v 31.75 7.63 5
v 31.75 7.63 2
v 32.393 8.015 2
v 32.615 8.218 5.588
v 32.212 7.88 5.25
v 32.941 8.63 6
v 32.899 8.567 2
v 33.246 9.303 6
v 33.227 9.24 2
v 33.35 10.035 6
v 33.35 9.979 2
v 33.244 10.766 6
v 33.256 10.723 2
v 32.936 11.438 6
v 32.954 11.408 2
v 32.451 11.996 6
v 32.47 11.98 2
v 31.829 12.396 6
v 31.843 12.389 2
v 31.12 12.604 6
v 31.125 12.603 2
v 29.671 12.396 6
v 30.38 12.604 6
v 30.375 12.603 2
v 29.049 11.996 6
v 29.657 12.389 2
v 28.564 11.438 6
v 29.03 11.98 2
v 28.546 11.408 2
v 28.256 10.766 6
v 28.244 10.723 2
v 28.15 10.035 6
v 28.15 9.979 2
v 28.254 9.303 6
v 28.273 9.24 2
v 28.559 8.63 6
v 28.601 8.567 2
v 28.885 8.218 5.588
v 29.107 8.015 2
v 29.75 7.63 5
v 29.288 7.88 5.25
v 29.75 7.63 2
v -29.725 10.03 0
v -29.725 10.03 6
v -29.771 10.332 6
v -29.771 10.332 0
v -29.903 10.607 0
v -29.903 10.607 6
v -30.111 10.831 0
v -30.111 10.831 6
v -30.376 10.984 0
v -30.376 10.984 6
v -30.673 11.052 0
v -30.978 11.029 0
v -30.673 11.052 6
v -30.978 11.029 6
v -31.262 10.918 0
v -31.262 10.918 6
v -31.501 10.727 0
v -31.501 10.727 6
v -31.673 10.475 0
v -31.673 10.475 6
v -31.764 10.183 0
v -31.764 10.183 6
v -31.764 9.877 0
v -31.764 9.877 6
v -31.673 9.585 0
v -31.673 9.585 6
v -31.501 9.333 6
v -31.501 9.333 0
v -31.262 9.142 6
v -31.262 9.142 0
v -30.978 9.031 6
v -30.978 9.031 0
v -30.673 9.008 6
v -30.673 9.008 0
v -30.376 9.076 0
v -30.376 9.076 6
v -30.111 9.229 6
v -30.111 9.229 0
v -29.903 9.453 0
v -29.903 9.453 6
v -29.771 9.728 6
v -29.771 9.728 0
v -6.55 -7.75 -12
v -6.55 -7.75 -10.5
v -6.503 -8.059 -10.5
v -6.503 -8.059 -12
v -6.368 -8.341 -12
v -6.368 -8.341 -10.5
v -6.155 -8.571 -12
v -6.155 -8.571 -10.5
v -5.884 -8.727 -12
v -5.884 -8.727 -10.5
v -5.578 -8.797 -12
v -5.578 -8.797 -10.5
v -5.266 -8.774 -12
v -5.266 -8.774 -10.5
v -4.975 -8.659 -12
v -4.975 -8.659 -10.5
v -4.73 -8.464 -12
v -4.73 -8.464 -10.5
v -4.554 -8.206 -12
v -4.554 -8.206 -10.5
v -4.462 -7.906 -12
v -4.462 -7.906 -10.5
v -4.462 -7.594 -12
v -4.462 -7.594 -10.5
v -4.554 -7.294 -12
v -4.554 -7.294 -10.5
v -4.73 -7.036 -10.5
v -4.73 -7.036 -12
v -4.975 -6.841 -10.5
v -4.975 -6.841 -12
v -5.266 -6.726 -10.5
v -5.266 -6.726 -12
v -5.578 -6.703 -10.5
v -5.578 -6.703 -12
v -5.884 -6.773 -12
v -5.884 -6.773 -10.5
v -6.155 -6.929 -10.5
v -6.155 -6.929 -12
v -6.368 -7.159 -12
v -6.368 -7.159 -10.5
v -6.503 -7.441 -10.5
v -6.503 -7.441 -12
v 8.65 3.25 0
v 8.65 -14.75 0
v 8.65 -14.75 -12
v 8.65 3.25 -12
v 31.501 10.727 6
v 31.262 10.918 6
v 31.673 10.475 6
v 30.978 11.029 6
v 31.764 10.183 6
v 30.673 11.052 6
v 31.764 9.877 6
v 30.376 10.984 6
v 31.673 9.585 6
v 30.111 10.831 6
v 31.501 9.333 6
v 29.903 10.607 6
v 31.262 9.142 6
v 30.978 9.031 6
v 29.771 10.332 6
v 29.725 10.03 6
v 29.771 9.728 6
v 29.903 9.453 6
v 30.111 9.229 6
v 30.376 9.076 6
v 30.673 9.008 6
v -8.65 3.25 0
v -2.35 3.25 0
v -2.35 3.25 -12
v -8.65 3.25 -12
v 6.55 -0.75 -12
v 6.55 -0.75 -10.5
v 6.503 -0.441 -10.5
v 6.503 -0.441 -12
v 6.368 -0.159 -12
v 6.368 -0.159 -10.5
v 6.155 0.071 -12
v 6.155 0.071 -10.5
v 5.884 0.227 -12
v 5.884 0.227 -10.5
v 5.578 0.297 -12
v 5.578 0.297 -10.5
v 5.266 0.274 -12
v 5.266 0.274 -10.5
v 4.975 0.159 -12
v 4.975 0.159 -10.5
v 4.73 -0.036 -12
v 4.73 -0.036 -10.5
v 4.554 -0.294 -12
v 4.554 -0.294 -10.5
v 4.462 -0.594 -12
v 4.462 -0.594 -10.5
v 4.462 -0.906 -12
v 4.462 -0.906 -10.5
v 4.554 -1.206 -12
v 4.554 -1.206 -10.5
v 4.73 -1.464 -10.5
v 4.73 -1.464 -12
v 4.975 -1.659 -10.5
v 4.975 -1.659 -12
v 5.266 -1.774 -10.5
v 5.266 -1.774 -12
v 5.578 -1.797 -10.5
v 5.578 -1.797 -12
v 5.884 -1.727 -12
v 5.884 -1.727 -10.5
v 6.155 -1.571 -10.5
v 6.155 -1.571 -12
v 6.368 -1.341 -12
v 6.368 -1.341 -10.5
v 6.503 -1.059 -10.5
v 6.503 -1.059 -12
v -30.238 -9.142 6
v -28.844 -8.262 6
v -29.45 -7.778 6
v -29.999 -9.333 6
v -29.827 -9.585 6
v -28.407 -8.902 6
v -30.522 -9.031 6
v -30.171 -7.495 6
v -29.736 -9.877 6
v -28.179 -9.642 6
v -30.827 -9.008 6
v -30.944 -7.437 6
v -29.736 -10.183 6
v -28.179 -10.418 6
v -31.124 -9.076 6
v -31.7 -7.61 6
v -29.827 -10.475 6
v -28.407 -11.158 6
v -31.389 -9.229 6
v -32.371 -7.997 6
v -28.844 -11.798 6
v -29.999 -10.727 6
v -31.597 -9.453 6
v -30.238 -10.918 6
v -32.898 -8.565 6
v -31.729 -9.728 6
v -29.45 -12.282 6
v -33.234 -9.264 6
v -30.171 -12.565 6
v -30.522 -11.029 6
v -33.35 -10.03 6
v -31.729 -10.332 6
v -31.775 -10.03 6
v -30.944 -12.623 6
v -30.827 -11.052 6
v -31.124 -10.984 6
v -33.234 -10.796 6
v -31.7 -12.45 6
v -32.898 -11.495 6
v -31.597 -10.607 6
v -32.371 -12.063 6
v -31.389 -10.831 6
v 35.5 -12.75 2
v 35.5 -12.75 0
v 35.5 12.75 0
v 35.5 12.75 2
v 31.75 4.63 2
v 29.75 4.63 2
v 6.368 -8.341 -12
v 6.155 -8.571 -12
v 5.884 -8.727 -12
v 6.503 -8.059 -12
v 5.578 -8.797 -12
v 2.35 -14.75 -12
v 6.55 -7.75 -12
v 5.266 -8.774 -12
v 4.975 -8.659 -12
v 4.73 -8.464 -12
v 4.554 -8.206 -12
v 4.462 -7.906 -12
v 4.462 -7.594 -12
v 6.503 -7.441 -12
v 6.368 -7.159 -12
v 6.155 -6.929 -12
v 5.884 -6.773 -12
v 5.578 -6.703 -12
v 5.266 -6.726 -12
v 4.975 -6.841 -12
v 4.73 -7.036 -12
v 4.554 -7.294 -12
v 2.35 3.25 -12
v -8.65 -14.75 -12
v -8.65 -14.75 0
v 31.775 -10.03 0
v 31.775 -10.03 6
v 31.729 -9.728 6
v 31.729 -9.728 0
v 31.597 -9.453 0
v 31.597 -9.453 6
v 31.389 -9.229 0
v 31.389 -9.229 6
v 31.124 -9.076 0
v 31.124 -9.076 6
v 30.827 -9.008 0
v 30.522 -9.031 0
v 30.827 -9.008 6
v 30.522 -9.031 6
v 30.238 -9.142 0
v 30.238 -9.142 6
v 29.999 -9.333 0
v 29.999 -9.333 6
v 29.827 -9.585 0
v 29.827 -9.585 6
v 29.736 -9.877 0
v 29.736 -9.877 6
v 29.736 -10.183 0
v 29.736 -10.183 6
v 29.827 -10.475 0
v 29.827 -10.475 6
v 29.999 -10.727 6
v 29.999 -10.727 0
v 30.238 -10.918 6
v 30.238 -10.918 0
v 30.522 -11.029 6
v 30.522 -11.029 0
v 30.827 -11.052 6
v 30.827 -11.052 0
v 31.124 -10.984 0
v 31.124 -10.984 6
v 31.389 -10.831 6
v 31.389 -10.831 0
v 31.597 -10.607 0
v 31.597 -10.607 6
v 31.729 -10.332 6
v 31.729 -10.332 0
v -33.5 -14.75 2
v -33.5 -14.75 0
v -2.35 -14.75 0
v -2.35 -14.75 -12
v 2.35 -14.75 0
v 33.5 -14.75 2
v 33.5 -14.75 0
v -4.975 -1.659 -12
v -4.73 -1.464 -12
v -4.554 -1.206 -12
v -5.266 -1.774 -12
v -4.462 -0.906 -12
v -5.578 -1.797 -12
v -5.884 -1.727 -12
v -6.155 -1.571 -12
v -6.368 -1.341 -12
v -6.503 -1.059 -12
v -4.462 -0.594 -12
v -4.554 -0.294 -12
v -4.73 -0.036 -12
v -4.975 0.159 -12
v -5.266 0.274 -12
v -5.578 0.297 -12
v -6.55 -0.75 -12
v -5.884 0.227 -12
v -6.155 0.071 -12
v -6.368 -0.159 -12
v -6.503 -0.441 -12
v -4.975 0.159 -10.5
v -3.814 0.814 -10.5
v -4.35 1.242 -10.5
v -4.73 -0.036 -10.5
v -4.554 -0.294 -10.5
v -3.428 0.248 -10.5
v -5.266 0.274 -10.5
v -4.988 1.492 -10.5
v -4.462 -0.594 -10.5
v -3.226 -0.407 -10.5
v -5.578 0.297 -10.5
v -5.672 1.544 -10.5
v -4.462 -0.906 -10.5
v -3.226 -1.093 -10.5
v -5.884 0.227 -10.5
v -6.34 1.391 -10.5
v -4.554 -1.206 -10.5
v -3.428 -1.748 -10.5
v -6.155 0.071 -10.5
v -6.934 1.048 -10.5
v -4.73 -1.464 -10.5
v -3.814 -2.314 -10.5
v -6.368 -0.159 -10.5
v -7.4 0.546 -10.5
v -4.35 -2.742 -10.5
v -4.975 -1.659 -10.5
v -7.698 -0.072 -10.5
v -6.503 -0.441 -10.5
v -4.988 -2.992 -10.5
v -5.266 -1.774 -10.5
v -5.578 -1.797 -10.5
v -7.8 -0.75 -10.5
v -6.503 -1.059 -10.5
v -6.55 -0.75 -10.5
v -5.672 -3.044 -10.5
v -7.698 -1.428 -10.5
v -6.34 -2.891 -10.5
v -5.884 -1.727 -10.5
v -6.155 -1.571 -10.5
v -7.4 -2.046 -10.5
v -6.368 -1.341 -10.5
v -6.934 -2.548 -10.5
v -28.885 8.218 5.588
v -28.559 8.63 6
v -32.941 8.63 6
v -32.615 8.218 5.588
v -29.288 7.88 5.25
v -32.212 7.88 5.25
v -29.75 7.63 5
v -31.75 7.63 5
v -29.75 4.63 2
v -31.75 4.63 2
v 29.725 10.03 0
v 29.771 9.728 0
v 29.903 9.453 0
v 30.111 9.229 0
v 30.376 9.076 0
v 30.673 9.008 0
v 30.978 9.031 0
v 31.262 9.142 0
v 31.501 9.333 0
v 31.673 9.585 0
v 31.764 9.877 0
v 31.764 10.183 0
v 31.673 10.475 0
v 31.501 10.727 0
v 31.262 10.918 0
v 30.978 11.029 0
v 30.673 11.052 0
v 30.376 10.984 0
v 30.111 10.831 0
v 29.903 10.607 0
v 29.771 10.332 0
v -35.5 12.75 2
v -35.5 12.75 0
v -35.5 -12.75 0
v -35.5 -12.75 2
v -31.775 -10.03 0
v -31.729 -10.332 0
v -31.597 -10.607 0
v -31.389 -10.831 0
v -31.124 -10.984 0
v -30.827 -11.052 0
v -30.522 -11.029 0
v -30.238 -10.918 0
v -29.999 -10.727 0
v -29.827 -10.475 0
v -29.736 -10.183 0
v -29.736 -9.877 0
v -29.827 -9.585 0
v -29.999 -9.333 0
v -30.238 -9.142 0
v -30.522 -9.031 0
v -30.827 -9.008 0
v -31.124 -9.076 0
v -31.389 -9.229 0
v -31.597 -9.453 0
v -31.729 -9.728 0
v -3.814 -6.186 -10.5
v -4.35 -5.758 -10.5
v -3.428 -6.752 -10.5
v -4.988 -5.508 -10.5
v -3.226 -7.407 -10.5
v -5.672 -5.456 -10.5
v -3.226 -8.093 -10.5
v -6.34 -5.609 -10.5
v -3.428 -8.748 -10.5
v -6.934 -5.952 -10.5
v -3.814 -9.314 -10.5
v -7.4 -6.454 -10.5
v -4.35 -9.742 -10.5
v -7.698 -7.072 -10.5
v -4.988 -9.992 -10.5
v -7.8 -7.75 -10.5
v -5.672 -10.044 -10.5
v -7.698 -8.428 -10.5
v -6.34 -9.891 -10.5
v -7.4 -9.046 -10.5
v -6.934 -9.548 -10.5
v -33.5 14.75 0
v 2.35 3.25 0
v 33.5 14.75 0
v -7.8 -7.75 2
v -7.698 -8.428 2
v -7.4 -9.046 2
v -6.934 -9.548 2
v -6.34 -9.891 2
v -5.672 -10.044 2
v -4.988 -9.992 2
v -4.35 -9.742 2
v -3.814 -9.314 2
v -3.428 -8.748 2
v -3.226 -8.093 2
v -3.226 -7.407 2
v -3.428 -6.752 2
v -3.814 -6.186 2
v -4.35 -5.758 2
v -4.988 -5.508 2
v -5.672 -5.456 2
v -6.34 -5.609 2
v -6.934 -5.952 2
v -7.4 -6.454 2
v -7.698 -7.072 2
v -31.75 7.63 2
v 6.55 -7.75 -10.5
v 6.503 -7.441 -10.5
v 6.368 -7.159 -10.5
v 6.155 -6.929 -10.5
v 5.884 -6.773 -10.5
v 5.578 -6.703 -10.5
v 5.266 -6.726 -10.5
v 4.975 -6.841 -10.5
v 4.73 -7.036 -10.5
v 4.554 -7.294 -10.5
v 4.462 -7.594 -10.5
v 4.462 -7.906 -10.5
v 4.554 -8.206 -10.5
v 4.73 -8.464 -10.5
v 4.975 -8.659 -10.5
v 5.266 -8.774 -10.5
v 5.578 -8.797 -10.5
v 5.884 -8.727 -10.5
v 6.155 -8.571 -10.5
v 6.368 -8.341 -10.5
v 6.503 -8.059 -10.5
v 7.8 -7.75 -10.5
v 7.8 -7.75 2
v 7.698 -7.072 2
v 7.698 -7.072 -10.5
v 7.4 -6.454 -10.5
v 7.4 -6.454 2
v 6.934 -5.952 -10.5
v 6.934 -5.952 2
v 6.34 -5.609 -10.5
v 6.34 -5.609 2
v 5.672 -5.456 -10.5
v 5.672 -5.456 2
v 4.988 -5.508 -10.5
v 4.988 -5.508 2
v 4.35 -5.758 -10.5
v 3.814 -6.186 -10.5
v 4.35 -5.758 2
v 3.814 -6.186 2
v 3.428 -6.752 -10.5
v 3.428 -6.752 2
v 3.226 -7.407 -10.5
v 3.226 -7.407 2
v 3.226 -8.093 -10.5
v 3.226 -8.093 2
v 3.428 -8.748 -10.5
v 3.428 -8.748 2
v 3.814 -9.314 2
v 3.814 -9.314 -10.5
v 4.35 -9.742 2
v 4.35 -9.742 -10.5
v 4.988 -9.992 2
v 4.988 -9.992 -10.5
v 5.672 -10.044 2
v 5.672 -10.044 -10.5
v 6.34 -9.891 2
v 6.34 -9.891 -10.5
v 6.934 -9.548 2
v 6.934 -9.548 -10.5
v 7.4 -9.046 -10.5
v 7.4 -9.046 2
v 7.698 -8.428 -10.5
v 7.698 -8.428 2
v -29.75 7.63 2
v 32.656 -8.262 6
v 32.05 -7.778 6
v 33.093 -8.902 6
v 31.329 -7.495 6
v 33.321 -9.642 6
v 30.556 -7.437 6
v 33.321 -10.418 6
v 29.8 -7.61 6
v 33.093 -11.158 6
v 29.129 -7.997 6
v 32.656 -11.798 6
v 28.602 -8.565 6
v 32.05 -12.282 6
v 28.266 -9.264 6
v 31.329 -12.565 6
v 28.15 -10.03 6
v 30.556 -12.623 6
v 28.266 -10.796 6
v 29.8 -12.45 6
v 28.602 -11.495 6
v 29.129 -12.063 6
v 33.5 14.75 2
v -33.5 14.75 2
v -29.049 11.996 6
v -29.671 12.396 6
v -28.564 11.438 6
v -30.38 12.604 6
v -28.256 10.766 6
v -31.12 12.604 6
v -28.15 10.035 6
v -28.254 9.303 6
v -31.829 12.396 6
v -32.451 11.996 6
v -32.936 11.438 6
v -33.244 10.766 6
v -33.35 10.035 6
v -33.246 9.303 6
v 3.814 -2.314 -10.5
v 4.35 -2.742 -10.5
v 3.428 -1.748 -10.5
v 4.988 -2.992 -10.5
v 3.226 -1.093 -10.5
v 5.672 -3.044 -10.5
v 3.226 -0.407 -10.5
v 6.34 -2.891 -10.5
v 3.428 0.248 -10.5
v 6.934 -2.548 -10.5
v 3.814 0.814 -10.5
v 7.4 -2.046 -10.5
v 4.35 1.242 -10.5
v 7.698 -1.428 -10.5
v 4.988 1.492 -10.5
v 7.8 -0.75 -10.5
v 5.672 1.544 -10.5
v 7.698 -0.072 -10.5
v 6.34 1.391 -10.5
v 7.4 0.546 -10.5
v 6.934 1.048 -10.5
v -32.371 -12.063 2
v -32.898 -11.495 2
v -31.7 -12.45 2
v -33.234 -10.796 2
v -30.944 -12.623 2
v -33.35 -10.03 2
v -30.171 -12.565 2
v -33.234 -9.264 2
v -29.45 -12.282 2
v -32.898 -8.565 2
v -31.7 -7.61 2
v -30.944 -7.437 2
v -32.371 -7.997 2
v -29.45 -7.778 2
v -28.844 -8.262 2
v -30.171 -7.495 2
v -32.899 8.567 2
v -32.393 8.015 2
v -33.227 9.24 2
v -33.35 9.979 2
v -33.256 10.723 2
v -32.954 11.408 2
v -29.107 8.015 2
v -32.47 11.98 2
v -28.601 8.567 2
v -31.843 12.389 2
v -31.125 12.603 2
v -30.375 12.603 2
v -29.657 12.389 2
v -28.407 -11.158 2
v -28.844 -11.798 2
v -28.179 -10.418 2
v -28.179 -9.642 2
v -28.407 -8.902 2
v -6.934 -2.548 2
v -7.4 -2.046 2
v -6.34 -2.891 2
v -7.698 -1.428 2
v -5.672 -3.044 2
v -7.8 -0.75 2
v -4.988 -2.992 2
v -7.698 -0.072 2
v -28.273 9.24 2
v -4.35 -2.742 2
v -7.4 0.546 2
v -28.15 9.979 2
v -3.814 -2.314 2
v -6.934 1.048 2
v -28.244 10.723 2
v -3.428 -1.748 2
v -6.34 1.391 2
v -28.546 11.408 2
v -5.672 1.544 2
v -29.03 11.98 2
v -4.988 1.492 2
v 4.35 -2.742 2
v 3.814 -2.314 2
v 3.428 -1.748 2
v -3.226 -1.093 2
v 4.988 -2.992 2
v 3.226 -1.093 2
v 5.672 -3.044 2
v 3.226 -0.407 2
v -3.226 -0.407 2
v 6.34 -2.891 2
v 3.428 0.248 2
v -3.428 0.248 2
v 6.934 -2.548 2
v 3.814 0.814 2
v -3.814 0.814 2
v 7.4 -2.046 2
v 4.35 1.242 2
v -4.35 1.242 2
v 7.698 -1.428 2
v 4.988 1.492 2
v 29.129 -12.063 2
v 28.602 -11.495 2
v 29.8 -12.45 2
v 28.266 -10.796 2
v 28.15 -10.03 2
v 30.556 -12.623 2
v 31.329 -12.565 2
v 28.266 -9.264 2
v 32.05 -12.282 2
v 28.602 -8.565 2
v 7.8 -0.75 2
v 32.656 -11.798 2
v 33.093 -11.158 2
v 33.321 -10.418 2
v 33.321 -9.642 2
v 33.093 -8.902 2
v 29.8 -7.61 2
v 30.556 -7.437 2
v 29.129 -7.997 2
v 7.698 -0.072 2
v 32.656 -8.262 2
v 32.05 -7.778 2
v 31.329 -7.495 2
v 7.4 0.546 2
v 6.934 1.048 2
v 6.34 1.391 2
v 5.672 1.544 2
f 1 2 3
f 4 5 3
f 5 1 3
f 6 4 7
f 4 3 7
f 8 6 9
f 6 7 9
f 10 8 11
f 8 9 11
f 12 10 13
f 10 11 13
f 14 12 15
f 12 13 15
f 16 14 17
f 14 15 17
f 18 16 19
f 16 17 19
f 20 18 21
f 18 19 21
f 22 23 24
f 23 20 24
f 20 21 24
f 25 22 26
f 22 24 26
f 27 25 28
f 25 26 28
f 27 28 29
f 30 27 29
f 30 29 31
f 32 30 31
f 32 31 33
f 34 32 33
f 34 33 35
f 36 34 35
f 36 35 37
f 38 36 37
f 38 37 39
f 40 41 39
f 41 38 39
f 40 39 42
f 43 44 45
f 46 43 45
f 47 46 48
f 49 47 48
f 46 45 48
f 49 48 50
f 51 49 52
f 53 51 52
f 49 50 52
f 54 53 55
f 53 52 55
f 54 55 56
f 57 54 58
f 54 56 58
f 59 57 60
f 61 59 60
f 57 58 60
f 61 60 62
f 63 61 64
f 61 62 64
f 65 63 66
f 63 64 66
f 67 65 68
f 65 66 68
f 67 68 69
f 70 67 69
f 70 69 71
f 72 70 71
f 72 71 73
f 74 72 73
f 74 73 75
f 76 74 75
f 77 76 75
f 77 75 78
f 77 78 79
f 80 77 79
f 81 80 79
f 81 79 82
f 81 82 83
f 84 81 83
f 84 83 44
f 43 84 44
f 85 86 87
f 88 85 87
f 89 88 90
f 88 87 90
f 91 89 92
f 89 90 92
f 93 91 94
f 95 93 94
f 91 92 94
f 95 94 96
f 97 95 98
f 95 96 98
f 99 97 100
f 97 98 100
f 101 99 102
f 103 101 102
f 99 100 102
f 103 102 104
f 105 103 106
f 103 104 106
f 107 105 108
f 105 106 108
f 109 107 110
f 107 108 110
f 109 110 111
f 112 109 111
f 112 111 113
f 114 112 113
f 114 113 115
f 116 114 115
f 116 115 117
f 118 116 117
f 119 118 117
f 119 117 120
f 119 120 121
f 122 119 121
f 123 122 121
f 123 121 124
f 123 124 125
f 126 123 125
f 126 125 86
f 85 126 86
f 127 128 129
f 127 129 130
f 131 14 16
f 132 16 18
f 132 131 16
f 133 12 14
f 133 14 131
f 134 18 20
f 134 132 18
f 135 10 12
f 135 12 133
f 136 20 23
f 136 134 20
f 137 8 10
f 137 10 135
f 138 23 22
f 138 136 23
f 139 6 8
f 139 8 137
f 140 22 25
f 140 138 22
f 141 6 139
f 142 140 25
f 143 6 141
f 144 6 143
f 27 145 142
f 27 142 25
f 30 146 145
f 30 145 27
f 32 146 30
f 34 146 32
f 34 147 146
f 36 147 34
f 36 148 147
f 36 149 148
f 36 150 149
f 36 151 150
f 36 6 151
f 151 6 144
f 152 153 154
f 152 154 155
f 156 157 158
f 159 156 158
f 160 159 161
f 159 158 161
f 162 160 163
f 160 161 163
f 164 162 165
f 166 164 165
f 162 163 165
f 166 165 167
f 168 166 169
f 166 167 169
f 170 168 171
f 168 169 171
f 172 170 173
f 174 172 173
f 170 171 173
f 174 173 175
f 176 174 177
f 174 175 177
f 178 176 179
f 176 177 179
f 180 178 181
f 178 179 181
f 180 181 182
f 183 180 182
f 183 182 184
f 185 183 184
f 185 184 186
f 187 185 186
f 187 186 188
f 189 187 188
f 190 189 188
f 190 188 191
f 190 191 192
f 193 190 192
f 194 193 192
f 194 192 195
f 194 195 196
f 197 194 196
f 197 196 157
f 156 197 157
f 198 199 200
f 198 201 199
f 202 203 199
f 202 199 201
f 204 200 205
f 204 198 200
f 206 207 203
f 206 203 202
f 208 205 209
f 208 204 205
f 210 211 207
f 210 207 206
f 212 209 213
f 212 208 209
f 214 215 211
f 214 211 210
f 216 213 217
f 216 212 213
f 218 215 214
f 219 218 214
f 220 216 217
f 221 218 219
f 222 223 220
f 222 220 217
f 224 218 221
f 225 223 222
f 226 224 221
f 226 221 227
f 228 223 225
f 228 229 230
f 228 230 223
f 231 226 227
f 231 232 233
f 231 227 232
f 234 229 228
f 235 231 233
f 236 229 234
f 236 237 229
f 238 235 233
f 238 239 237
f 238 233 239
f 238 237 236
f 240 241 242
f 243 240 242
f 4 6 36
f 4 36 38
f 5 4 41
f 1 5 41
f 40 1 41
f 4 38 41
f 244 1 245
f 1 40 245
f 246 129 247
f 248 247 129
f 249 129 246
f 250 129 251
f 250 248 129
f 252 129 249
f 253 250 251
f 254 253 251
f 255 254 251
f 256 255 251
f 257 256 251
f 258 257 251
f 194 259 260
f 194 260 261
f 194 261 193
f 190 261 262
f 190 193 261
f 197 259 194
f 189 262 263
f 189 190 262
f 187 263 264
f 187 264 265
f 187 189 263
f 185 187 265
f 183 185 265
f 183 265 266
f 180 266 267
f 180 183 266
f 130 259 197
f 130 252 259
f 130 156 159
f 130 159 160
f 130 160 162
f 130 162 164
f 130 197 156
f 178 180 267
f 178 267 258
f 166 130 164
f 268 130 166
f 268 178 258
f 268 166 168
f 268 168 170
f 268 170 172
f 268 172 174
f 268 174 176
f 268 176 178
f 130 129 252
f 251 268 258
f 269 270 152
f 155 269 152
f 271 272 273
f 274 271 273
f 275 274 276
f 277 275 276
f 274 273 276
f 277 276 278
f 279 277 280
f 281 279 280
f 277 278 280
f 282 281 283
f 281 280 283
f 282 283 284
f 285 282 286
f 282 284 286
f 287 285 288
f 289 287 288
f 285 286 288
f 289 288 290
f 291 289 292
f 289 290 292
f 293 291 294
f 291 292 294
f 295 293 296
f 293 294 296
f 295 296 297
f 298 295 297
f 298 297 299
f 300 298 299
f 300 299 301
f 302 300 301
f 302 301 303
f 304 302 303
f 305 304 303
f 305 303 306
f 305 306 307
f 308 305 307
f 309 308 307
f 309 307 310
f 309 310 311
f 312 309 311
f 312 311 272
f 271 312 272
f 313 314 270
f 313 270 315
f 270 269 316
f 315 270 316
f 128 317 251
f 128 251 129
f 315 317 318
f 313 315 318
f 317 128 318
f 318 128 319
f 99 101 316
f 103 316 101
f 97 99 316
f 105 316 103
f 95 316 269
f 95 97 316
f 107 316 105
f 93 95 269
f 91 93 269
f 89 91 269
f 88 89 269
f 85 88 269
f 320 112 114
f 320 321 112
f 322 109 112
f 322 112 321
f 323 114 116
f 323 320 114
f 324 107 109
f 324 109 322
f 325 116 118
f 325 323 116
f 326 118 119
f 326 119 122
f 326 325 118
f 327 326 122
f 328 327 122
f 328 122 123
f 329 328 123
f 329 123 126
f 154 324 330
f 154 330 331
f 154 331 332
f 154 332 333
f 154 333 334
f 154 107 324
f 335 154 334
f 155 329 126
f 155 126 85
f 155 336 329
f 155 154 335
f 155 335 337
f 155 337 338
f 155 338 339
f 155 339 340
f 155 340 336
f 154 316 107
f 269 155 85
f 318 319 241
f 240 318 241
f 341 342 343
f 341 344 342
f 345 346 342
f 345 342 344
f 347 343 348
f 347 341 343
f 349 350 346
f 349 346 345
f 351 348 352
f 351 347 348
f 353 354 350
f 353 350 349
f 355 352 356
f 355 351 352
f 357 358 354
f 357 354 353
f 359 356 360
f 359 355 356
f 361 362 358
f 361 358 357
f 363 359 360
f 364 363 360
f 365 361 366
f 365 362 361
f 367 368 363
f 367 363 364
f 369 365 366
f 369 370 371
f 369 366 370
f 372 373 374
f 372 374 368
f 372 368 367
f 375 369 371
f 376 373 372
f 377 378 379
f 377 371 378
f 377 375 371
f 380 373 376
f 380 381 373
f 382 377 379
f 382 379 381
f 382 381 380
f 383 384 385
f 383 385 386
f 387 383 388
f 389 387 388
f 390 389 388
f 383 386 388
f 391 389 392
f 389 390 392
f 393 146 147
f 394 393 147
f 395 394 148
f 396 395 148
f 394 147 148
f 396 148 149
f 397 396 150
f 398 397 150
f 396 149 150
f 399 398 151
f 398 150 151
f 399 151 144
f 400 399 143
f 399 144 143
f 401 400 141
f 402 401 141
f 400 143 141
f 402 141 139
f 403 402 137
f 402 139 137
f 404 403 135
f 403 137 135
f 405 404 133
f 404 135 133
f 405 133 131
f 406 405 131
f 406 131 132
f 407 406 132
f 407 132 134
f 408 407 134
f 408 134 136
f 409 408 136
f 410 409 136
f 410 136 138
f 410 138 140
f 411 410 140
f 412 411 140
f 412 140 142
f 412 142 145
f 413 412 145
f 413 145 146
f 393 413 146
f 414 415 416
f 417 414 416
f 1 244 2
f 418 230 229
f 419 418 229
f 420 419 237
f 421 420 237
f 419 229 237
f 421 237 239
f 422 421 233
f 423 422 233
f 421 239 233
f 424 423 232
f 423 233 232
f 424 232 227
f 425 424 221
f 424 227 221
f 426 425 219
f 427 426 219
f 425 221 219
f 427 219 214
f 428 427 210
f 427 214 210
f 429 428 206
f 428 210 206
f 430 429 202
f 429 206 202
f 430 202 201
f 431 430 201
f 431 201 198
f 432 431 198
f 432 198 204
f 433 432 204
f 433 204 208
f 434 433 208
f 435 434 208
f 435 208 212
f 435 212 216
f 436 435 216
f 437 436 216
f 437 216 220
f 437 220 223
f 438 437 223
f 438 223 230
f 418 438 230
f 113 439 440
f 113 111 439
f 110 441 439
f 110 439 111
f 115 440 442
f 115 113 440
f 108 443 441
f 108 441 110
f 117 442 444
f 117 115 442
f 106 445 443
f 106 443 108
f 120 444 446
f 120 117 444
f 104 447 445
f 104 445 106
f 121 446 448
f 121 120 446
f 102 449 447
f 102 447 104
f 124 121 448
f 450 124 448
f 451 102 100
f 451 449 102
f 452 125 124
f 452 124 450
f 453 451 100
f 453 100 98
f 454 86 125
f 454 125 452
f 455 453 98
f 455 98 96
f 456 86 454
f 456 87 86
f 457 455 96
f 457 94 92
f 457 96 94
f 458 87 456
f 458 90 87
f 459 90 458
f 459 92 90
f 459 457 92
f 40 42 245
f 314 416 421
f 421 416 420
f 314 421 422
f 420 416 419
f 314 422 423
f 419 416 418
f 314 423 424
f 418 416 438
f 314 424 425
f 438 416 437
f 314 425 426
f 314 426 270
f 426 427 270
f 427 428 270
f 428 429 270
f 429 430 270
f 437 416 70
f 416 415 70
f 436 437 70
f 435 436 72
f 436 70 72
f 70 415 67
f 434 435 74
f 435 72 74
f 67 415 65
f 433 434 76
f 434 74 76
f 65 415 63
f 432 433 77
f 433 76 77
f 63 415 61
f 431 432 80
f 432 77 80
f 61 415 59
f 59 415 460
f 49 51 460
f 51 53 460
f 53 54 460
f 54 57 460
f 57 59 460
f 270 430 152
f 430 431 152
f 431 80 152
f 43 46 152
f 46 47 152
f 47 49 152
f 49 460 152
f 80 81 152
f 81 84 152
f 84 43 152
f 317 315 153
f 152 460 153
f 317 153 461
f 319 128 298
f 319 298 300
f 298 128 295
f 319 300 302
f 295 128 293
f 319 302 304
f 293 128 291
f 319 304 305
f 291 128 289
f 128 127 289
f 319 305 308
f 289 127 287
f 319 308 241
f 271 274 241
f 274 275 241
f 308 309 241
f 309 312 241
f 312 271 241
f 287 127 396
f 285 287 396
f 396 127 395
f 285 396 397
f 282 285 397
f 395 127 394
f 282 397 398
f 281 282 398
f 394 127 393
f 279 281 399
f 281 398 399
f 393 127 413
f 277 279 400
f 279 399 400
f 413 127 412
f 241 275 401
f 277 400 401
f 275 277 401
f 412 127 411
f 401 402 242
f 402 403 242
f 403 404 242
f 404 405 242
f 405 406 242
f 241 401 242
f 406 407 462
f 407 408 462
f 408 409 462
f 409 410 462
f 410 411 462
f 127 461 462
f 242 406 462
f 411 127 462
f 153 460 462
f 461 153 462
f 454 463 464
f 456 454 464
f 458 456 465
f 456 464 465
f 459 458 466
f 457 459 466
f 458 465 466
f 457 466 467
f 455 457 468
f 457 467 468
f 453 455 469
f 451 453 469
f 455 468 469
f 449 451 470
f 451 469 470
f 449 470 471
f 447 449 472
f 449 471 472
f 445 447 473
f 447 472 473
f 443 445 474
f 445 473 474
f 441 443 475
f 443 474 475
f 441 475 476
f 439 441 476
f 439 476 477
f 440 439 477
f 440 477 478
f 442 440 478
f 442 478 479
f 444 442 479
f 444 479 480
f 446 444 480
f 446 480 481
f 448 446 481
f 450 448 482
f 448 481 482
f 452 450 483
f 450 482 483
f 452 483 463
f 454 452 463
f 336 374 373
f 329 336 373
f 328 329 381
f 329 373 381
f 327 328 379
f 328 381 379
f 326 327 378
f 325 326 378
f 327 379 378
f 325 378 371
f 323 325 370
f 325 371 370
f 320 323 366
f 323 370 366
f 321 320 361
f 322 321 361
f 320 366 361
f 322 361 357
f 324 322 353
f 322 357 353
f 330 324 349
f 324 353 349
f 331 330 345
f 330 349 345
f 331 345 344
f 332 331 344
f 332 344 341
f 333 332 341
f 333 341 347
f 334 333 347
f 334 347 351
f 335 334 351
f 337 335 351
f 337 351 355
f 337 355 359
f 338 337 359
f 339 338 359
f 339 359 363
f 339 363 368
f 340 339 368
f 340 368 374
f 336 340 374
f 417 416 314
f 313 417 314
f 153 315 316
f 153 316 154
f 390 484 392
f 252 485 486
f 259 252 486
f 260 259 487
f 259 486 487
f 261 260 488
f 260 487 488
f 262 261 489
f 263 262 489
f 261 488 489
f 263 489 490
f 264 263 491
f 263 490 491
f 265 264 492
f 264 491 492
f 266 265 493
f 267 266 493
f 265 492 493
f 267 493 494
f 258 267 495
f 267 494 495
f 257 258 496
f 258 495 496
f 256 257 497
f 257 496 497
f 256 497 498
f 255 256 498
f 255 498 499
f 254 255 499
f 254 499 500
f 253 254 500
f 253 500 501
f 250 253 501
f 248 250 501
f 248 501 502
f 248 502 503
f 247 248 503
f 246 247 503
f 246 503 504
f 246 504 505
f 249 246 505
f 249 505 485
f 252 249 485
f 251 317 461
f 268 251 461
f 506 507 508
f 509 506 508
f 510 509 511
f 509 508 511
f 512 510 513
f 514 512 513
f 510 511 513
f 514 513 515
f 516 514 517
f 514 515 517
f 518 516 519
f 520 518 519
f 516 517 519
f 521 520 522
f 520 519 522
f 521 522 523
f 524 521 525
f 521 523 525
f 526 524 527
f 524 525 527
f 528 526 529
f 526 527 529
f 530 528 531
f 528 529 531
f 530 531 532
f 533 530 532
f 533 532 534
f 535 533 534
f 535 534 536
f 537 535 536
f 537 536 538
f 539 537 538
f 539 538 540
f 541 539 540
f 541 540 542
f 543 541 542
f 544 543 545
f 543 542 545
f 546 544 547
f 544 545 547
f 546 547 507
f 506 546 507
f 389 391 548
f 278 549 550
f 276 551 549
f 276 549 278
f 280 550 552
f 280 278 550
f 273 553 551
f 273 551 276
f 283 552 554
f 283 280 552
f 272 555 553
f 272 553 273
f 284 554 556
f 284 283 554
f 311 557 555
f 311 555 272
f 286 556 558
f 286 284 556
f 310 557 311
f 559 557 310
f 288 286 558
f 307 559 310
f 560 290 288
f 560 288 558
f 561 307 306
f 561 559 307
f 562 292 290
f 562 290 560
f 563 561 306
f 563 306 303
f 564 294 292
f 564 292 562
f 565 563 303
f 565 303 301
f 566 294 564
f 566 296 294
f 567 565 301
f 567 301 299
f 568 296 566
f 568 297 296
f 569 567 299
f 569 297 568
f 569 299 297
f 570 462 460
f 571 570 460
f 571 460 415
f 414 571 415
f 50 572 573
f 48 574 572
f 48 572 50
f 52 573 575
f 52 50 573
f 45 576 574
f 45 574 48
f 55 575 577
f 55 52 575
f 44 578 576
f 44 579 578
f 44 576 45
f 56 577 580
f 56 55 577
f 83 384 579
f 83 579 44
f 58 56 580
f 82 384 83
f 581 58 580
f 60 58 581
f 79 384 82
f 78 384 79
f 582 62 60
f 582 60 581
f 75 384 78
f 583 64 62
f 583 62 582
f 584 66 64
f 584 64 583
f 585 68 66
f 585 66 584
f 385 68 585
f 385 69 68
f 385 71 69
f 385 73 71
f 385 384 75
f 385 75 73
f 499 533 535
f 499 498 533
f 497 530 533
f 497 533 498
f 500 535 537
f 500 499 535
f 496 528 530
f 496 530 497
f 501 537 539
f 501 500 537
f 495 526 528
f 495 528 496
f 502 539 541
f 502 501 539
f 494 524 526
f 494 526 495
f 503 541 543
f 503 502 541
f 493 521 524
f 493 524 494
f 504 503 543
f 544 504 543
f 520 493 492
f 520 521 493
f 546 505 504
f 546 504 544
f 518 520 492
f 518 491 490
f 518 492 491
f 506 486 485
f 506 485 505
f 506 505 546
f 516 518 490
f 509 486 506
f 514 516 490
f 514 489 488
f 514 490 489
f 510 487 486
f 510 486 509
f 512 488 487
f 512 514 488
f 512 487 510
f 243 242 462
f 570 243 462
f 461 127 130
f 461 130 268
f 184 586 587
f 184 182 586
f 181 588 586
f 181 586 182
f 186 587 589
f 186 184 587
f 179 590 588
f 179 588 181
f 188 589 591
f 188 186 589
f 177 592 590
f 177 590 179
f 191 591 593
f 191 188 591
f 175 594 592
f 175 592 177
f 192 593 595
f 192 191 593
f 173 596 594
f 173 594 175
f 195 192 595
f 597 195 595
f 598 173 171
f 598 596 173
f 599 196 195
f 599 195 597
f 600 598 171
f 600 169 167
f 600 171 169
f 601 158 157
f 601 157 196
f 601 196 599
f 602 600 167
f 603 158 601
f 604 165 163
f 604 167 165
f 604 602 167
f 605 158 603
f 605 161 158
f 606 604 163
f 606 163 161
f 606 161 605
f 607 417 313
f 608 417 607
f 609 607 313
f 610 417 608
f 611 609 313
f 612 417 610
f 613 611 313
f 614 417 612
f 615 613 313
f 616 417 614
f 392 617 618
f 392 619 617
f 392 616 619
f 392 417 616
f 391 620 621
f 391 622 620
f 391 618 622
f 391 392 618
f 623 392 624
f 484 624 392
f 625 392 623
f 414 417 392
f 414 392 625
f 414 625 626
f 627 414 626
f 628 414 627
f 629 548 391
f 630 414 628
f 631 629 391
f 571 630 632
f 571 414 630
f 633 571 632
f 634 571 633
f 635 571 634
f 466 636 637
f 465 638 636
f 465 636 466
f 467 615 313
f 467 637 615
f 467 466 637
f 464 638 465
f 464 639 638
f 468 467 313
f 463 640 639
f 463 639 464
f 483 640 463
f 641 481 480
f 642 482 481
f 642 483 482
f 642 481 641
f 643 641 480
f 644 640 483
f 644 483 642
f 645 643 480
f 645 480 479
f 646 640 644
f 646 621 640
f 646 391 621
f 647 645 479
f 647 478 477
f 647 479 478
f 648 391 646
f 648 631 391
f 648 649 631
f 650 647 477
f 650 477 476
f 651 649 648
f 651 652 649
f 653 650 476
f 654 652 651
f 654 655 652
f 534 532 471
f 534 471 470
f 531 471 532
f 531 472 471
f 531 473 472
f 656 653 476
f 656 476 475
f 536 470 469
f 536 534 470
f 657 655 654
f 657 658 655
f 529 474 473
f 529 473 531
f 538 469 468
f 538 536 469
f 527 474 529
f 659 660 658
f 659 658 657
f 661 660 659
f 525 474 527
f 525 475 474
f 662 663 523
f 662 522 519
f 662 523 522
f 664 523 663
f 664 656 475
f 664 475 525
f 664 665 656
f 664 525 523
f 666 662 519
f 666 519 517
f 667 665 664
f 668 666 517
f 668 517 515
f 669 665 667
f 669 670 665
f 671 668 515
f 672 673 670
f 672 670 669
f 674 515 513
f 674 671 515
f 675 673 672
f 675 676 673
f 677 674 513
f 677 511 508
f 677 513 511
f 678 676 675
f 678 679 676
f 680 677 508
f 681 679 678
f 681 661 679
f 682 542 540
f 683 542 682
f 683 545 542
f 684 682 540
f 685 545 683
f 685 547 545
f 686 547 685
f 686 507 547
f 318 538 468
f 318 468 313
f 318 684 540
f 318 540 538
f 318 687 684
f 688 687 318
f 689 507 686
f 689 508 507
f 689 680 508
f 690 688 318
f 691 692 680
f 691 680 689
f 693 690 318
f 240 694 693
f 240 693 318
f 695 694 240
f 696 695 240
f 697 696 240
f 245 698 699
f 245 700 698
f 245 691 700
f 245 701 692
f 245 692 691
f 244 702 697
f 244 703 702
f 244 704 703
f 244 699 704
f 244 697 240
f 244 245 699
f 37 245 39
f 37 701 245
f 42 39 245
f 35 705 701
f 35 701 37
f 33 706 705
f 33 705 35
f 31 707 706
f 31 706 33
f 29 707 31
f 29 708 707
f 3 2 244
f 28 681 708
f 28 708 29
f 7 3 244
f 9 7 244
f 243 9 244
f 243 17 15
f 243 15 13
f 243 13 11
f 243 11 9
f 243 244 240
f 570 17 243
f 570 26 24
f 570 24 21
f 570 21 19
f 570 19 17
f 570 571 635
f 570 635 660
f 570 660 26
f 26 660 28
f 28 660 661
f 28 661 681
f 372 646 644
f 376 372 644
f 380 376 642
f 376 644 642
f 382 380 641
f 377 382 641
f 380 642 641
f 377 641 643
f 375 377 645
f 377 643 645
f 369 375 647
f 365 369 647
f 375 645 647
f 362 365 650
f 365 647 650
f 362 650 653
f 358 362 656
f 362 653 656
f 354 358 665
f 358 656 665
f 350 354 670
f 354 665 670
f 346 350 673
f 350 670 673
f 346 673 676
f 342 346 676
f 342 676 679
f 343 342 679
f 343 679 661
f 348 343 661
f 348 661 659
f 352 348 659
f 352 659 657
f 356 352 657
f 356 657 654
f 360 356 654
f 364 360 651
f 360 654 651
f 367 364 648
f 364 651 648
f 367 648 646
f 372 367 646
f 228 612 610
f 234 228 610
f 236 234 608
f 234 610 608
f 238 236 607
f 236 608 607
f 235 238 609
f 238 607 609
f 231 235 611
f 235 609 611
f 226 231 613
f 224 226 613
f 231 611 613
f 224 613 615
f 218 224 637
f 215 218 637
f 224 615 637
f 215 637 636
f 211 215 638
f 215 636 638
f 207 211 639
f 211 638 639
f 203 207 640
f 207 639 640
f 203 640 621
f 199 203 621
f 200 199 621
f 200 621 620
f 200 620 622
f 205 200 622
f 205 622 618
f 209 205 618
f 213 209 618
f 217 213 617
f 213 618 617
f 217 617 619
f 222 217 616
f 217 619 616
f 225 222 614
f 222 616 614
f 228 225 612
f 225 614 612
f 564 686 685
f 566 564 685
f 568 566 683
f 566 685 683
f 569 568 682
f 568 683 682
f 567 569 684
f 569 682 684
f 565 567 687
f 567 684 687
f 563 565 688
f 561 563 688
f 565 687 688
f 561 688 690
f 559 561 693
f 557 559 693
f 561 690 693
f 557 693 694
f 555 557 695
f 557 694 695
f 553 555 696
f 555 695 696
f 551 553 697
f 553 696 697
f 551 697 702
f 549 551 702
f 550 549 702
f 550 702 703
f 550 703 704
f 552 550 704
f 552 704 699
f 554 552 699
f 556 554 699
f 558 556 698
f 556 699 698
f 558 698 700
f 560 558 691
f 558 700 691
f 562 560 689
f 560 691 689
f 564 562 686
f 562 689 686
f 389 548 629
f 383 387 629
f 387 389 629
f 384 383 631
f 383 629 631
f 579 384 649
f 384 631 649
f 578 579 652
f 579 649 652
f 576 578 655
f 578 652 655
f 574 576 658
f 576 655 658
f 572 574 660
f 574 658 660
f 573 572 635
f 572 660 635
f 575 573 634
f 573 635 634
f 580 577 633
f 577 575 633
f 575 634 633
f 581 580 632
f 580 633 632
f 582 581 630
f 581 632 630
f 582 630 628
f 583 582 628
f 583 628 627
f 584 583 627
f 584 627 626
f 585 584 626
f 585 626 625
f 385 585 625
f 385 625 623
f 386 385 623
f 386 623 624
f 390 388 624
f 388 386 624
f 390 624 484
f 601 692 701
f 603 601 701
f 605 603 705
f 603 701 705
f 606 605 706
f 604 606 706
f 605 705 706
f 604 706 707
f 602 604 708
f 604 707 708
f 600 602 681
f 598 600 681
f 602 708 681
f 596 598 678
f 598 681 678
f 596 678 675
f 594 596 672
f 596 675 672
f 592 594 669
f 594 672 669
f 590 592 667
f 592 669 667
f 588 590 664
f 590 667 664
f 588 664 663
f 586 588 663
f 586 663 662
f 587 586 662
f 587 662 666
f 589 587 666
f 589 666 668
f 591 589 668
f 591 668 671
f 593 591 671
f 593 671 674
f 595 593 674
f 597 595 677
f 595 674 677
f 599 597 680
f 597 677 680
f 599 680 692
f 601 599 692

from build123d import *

# Parameters (mm, degrees)
BOSS_EXTRUDE1_DEPTH = 2
SKETCH5_R           = 2.6
BOSS_EXTRUDE4_DEPTH = 4
SKETCH6_R           = 1.025
CUT_EXTRUDE1_DEPTH  = 39.907743445
BOSS_EXTRUDE6_DEPTH = 4
CHAMFER1_SIZE       = 5
SKETCH8_W           = 6.3
SKETCH8_H           = 18
BOSS_EXTRUDE8_DEPTH = 12
SKETCH9_R           = 1.05
CUT_EXTRUDE3_DEPTH  = 41.912253666
SKETCH10_R          = 2.3
CUT_EXTRUDE4_DEPTH  = 12.5


with BuildPart() as part:
    # Sketch1 → Boss-Extrude1 (new body)
    with BuildSketch(Plane.XY):
        Polygon((-33.5, 14.75), (-35.5, 12.75), (-35.5, -12.75), (-33.5, -14.75), (33.5, -14.75), (35.5, -12.75), (35.5, 12.75), (33.5, 14.75), align=None)
    extrude(amount=BOSS_EXTRUDE1_DEPTH)

    # Sketch5 → Boss-Extrude4 (add)
    with BuildSketch(Plane.XY.offset(2)):
        with Locations(Location((-30.75, 10.03, 0), (0, 0, 180))):
            Circle(SKETCH5_R)
        with Locations(Location((30.75, 10.03, 0), (0, 0, 180))):
            Circle(SKETCH5_R)
        with Locations(Location((30.75, -10.03, 0), (0, 0, 180))):
            Circle(SKETCH5_R)
        with Locations(Location((-30.75, -10.03, 0), (0, 0, 180))):
            Circle(SKETCH5_R)
    extrude(amount=BOSS_EXTRUDE4_DEPTH)

    # Sketch6 → Cut-Extrude1 (cut, through all)
    with BuildSketch(Plane.XY.offset(6)):
        with Locations((-30.75, 10.03)):
            Circle(SKETCH6_R)
        with Locations(Location((30.75, 10.03, 0), (0, 0, 180))):
            Circle(SKETCH6_R)
        with Locations((30.75, -10.03)):
            Circle(SKETCH6_R)
        with Locations(Location((-30.75, -10.03, 0), (0, 0, 180))):
            Circle(SKETCH6_R)
    extrude(amount=-CUT_EXTRUDE1_DEPTH, mode=Mode.SUBTRACT)

    # Sketch7 → Boss-Extrude6 (add)
    with BuildSketch(Plane.XY.offset(2)):
        with BuildLine():
            Line((-31.75, 7.63), (-31.75, 3.63))
            Line((-31.75, 3.63), (-29.75, 3.63))
            Line((-29.75, 3.63), (-29.75, 7.63))
            ThreePointArc((-29.75, 7.63), (-30.75, 7.43), (-31.75, 7.63))
        make_face()
        with BuildLine():
            Line((29.75, 7.63), (29.75, 3.63))
            Line((29.75, 3.63), (31.75, 3.63))
            Line((31.75, 3.63), (31.75, 7.63))
            ThreePointArc((31.75, 7.63), (30.75, 7.43), (29.75, 7.63))
        make_face()
    extrude(amount=BOSS_EXTRUDE6_DEPTH)

    # Chamfer1
    # the kernel refuses this chamfer: 5 mm, written as the material it takes off along each edge
    with BuildSketch(Plane(origin=(16.89158506, 3.63, 6), x_dir=(0, 0.9996219169112968, 0.027495876610586317), z_dir=(1, 0, 0))) as chamfer1_piece_1_section:
        Polygon((CHAMFER1_SIZE * 0.999621916911, -CHAMFER1_SIZE * 0.0274958766106), (-CHAMFER1_SIZE * 0.0274958766106, -CHAMFER1_SIZE * 0.999621916911), (0, 0), align=None)
    chamfer1_piece_1 = extrude(amount=27.71682988, mode=Mode.PRIVATE)
    chamfer1_piece_1 = split(chamfer1_piece_1, bisect_by=Plane(origin=(30.75, 5.358592062, 2), z_dir=(0, 0, 1)), keep=Keep.TOP, mode=Mode.PRIVATE)
    add(chamfer1_piece_1, mode=Mode.SUBTRACT)
    with BuildSketch(Plane(origin=(-44.60841494, 3.63, 6), x_dir=(0, 0.9996219169112968, 0.027495876610586317), z_dir=(1, 0, 0))) as chamfer1_piece_2_section:
        Polygon((CHAMFER1_SIZE * 0.999621916911, -CHAMFER1_SIZE * 0.0274958766106), (-CHAMFER1_SIZE * 0.0274958766106, -CHAMFER1_SIZE * 0.999621916911), (0, 0), align=None)
    chamfer1_piece_2 = extrude(amount=27.71682988, mode=Mode.PRIVATE)
    chamfer1_piece_2 = split(chamfer1_piece_2, bisect_by=Plane(origin=(-30.75, 5.358592062, 2), z_dir=(0, 0, 1)), keep=Keep.TOP, mode=Mode.PRIVATE)
    add(chamfer1_piece_2, mode=Mode.SUBTRACT)

    # Sketch8 → Boss-Extrude8 (add)
    with BuildSketch(Plane(origin=(0, 0, 0), x_dir=(-1, 0, 0), z_dir=(0, 0, -1))):
        with Locations((-5.5, -5.75)):
            Rectangle(SKETCH8_W, SKETCH8_H)
        with Locations((5.5, -5.75)):
            Rectangle(SKETCH8_W, SKETCH8_H)
    extrude(amount=BOSS_EXTRUDE8_DEPTH)

    # Sketch9 → Cut-Extrude3 (cut, through all)
    with BuildSketch(Plane.XY.offset(2)):
        with Locations((5.5, -7.75)):
            Circle(SKETCH9_R)
        with Locations((5.5, -0.75)):
            Circle(SKETCH9_R)
        with Locations(Location((-5.5, -0.75, 0), (0, 0, 180))):
            Circle(SKETCH9_R)
        with Locations(Location((-5.5, -7.75, 0), (0, 0, 180))):
            Circle(SKETCH9_R)
    extrude(amount=-CUT_EXTRUDE3_DEPTH, mode=Mode.SUBTRACT)

    # Sketch10 → Cut-Extrude4 (cut)
    with BuildSketch(Plane.XY.offset(2)):
        with Locations((5.5, -7.75)):
            Circle(SKETCH10_R)
        with Locations((5.5, -0.75)):
            Circle(SKETCH10_R)
        with Locations(Location((-5.5, -0.75, 0), (0, 0, 180))):
            Circle(SKETCH10_R)
        with Locations(Location((-5.5, -7.75, 0), (0, 0, 180))):
            Circle(SKETCH10_R)
    extrude(amount=-CUT_EXTRUDE4_DEPTH, mode=Mode.SUBTRACT)


solid = part.part
